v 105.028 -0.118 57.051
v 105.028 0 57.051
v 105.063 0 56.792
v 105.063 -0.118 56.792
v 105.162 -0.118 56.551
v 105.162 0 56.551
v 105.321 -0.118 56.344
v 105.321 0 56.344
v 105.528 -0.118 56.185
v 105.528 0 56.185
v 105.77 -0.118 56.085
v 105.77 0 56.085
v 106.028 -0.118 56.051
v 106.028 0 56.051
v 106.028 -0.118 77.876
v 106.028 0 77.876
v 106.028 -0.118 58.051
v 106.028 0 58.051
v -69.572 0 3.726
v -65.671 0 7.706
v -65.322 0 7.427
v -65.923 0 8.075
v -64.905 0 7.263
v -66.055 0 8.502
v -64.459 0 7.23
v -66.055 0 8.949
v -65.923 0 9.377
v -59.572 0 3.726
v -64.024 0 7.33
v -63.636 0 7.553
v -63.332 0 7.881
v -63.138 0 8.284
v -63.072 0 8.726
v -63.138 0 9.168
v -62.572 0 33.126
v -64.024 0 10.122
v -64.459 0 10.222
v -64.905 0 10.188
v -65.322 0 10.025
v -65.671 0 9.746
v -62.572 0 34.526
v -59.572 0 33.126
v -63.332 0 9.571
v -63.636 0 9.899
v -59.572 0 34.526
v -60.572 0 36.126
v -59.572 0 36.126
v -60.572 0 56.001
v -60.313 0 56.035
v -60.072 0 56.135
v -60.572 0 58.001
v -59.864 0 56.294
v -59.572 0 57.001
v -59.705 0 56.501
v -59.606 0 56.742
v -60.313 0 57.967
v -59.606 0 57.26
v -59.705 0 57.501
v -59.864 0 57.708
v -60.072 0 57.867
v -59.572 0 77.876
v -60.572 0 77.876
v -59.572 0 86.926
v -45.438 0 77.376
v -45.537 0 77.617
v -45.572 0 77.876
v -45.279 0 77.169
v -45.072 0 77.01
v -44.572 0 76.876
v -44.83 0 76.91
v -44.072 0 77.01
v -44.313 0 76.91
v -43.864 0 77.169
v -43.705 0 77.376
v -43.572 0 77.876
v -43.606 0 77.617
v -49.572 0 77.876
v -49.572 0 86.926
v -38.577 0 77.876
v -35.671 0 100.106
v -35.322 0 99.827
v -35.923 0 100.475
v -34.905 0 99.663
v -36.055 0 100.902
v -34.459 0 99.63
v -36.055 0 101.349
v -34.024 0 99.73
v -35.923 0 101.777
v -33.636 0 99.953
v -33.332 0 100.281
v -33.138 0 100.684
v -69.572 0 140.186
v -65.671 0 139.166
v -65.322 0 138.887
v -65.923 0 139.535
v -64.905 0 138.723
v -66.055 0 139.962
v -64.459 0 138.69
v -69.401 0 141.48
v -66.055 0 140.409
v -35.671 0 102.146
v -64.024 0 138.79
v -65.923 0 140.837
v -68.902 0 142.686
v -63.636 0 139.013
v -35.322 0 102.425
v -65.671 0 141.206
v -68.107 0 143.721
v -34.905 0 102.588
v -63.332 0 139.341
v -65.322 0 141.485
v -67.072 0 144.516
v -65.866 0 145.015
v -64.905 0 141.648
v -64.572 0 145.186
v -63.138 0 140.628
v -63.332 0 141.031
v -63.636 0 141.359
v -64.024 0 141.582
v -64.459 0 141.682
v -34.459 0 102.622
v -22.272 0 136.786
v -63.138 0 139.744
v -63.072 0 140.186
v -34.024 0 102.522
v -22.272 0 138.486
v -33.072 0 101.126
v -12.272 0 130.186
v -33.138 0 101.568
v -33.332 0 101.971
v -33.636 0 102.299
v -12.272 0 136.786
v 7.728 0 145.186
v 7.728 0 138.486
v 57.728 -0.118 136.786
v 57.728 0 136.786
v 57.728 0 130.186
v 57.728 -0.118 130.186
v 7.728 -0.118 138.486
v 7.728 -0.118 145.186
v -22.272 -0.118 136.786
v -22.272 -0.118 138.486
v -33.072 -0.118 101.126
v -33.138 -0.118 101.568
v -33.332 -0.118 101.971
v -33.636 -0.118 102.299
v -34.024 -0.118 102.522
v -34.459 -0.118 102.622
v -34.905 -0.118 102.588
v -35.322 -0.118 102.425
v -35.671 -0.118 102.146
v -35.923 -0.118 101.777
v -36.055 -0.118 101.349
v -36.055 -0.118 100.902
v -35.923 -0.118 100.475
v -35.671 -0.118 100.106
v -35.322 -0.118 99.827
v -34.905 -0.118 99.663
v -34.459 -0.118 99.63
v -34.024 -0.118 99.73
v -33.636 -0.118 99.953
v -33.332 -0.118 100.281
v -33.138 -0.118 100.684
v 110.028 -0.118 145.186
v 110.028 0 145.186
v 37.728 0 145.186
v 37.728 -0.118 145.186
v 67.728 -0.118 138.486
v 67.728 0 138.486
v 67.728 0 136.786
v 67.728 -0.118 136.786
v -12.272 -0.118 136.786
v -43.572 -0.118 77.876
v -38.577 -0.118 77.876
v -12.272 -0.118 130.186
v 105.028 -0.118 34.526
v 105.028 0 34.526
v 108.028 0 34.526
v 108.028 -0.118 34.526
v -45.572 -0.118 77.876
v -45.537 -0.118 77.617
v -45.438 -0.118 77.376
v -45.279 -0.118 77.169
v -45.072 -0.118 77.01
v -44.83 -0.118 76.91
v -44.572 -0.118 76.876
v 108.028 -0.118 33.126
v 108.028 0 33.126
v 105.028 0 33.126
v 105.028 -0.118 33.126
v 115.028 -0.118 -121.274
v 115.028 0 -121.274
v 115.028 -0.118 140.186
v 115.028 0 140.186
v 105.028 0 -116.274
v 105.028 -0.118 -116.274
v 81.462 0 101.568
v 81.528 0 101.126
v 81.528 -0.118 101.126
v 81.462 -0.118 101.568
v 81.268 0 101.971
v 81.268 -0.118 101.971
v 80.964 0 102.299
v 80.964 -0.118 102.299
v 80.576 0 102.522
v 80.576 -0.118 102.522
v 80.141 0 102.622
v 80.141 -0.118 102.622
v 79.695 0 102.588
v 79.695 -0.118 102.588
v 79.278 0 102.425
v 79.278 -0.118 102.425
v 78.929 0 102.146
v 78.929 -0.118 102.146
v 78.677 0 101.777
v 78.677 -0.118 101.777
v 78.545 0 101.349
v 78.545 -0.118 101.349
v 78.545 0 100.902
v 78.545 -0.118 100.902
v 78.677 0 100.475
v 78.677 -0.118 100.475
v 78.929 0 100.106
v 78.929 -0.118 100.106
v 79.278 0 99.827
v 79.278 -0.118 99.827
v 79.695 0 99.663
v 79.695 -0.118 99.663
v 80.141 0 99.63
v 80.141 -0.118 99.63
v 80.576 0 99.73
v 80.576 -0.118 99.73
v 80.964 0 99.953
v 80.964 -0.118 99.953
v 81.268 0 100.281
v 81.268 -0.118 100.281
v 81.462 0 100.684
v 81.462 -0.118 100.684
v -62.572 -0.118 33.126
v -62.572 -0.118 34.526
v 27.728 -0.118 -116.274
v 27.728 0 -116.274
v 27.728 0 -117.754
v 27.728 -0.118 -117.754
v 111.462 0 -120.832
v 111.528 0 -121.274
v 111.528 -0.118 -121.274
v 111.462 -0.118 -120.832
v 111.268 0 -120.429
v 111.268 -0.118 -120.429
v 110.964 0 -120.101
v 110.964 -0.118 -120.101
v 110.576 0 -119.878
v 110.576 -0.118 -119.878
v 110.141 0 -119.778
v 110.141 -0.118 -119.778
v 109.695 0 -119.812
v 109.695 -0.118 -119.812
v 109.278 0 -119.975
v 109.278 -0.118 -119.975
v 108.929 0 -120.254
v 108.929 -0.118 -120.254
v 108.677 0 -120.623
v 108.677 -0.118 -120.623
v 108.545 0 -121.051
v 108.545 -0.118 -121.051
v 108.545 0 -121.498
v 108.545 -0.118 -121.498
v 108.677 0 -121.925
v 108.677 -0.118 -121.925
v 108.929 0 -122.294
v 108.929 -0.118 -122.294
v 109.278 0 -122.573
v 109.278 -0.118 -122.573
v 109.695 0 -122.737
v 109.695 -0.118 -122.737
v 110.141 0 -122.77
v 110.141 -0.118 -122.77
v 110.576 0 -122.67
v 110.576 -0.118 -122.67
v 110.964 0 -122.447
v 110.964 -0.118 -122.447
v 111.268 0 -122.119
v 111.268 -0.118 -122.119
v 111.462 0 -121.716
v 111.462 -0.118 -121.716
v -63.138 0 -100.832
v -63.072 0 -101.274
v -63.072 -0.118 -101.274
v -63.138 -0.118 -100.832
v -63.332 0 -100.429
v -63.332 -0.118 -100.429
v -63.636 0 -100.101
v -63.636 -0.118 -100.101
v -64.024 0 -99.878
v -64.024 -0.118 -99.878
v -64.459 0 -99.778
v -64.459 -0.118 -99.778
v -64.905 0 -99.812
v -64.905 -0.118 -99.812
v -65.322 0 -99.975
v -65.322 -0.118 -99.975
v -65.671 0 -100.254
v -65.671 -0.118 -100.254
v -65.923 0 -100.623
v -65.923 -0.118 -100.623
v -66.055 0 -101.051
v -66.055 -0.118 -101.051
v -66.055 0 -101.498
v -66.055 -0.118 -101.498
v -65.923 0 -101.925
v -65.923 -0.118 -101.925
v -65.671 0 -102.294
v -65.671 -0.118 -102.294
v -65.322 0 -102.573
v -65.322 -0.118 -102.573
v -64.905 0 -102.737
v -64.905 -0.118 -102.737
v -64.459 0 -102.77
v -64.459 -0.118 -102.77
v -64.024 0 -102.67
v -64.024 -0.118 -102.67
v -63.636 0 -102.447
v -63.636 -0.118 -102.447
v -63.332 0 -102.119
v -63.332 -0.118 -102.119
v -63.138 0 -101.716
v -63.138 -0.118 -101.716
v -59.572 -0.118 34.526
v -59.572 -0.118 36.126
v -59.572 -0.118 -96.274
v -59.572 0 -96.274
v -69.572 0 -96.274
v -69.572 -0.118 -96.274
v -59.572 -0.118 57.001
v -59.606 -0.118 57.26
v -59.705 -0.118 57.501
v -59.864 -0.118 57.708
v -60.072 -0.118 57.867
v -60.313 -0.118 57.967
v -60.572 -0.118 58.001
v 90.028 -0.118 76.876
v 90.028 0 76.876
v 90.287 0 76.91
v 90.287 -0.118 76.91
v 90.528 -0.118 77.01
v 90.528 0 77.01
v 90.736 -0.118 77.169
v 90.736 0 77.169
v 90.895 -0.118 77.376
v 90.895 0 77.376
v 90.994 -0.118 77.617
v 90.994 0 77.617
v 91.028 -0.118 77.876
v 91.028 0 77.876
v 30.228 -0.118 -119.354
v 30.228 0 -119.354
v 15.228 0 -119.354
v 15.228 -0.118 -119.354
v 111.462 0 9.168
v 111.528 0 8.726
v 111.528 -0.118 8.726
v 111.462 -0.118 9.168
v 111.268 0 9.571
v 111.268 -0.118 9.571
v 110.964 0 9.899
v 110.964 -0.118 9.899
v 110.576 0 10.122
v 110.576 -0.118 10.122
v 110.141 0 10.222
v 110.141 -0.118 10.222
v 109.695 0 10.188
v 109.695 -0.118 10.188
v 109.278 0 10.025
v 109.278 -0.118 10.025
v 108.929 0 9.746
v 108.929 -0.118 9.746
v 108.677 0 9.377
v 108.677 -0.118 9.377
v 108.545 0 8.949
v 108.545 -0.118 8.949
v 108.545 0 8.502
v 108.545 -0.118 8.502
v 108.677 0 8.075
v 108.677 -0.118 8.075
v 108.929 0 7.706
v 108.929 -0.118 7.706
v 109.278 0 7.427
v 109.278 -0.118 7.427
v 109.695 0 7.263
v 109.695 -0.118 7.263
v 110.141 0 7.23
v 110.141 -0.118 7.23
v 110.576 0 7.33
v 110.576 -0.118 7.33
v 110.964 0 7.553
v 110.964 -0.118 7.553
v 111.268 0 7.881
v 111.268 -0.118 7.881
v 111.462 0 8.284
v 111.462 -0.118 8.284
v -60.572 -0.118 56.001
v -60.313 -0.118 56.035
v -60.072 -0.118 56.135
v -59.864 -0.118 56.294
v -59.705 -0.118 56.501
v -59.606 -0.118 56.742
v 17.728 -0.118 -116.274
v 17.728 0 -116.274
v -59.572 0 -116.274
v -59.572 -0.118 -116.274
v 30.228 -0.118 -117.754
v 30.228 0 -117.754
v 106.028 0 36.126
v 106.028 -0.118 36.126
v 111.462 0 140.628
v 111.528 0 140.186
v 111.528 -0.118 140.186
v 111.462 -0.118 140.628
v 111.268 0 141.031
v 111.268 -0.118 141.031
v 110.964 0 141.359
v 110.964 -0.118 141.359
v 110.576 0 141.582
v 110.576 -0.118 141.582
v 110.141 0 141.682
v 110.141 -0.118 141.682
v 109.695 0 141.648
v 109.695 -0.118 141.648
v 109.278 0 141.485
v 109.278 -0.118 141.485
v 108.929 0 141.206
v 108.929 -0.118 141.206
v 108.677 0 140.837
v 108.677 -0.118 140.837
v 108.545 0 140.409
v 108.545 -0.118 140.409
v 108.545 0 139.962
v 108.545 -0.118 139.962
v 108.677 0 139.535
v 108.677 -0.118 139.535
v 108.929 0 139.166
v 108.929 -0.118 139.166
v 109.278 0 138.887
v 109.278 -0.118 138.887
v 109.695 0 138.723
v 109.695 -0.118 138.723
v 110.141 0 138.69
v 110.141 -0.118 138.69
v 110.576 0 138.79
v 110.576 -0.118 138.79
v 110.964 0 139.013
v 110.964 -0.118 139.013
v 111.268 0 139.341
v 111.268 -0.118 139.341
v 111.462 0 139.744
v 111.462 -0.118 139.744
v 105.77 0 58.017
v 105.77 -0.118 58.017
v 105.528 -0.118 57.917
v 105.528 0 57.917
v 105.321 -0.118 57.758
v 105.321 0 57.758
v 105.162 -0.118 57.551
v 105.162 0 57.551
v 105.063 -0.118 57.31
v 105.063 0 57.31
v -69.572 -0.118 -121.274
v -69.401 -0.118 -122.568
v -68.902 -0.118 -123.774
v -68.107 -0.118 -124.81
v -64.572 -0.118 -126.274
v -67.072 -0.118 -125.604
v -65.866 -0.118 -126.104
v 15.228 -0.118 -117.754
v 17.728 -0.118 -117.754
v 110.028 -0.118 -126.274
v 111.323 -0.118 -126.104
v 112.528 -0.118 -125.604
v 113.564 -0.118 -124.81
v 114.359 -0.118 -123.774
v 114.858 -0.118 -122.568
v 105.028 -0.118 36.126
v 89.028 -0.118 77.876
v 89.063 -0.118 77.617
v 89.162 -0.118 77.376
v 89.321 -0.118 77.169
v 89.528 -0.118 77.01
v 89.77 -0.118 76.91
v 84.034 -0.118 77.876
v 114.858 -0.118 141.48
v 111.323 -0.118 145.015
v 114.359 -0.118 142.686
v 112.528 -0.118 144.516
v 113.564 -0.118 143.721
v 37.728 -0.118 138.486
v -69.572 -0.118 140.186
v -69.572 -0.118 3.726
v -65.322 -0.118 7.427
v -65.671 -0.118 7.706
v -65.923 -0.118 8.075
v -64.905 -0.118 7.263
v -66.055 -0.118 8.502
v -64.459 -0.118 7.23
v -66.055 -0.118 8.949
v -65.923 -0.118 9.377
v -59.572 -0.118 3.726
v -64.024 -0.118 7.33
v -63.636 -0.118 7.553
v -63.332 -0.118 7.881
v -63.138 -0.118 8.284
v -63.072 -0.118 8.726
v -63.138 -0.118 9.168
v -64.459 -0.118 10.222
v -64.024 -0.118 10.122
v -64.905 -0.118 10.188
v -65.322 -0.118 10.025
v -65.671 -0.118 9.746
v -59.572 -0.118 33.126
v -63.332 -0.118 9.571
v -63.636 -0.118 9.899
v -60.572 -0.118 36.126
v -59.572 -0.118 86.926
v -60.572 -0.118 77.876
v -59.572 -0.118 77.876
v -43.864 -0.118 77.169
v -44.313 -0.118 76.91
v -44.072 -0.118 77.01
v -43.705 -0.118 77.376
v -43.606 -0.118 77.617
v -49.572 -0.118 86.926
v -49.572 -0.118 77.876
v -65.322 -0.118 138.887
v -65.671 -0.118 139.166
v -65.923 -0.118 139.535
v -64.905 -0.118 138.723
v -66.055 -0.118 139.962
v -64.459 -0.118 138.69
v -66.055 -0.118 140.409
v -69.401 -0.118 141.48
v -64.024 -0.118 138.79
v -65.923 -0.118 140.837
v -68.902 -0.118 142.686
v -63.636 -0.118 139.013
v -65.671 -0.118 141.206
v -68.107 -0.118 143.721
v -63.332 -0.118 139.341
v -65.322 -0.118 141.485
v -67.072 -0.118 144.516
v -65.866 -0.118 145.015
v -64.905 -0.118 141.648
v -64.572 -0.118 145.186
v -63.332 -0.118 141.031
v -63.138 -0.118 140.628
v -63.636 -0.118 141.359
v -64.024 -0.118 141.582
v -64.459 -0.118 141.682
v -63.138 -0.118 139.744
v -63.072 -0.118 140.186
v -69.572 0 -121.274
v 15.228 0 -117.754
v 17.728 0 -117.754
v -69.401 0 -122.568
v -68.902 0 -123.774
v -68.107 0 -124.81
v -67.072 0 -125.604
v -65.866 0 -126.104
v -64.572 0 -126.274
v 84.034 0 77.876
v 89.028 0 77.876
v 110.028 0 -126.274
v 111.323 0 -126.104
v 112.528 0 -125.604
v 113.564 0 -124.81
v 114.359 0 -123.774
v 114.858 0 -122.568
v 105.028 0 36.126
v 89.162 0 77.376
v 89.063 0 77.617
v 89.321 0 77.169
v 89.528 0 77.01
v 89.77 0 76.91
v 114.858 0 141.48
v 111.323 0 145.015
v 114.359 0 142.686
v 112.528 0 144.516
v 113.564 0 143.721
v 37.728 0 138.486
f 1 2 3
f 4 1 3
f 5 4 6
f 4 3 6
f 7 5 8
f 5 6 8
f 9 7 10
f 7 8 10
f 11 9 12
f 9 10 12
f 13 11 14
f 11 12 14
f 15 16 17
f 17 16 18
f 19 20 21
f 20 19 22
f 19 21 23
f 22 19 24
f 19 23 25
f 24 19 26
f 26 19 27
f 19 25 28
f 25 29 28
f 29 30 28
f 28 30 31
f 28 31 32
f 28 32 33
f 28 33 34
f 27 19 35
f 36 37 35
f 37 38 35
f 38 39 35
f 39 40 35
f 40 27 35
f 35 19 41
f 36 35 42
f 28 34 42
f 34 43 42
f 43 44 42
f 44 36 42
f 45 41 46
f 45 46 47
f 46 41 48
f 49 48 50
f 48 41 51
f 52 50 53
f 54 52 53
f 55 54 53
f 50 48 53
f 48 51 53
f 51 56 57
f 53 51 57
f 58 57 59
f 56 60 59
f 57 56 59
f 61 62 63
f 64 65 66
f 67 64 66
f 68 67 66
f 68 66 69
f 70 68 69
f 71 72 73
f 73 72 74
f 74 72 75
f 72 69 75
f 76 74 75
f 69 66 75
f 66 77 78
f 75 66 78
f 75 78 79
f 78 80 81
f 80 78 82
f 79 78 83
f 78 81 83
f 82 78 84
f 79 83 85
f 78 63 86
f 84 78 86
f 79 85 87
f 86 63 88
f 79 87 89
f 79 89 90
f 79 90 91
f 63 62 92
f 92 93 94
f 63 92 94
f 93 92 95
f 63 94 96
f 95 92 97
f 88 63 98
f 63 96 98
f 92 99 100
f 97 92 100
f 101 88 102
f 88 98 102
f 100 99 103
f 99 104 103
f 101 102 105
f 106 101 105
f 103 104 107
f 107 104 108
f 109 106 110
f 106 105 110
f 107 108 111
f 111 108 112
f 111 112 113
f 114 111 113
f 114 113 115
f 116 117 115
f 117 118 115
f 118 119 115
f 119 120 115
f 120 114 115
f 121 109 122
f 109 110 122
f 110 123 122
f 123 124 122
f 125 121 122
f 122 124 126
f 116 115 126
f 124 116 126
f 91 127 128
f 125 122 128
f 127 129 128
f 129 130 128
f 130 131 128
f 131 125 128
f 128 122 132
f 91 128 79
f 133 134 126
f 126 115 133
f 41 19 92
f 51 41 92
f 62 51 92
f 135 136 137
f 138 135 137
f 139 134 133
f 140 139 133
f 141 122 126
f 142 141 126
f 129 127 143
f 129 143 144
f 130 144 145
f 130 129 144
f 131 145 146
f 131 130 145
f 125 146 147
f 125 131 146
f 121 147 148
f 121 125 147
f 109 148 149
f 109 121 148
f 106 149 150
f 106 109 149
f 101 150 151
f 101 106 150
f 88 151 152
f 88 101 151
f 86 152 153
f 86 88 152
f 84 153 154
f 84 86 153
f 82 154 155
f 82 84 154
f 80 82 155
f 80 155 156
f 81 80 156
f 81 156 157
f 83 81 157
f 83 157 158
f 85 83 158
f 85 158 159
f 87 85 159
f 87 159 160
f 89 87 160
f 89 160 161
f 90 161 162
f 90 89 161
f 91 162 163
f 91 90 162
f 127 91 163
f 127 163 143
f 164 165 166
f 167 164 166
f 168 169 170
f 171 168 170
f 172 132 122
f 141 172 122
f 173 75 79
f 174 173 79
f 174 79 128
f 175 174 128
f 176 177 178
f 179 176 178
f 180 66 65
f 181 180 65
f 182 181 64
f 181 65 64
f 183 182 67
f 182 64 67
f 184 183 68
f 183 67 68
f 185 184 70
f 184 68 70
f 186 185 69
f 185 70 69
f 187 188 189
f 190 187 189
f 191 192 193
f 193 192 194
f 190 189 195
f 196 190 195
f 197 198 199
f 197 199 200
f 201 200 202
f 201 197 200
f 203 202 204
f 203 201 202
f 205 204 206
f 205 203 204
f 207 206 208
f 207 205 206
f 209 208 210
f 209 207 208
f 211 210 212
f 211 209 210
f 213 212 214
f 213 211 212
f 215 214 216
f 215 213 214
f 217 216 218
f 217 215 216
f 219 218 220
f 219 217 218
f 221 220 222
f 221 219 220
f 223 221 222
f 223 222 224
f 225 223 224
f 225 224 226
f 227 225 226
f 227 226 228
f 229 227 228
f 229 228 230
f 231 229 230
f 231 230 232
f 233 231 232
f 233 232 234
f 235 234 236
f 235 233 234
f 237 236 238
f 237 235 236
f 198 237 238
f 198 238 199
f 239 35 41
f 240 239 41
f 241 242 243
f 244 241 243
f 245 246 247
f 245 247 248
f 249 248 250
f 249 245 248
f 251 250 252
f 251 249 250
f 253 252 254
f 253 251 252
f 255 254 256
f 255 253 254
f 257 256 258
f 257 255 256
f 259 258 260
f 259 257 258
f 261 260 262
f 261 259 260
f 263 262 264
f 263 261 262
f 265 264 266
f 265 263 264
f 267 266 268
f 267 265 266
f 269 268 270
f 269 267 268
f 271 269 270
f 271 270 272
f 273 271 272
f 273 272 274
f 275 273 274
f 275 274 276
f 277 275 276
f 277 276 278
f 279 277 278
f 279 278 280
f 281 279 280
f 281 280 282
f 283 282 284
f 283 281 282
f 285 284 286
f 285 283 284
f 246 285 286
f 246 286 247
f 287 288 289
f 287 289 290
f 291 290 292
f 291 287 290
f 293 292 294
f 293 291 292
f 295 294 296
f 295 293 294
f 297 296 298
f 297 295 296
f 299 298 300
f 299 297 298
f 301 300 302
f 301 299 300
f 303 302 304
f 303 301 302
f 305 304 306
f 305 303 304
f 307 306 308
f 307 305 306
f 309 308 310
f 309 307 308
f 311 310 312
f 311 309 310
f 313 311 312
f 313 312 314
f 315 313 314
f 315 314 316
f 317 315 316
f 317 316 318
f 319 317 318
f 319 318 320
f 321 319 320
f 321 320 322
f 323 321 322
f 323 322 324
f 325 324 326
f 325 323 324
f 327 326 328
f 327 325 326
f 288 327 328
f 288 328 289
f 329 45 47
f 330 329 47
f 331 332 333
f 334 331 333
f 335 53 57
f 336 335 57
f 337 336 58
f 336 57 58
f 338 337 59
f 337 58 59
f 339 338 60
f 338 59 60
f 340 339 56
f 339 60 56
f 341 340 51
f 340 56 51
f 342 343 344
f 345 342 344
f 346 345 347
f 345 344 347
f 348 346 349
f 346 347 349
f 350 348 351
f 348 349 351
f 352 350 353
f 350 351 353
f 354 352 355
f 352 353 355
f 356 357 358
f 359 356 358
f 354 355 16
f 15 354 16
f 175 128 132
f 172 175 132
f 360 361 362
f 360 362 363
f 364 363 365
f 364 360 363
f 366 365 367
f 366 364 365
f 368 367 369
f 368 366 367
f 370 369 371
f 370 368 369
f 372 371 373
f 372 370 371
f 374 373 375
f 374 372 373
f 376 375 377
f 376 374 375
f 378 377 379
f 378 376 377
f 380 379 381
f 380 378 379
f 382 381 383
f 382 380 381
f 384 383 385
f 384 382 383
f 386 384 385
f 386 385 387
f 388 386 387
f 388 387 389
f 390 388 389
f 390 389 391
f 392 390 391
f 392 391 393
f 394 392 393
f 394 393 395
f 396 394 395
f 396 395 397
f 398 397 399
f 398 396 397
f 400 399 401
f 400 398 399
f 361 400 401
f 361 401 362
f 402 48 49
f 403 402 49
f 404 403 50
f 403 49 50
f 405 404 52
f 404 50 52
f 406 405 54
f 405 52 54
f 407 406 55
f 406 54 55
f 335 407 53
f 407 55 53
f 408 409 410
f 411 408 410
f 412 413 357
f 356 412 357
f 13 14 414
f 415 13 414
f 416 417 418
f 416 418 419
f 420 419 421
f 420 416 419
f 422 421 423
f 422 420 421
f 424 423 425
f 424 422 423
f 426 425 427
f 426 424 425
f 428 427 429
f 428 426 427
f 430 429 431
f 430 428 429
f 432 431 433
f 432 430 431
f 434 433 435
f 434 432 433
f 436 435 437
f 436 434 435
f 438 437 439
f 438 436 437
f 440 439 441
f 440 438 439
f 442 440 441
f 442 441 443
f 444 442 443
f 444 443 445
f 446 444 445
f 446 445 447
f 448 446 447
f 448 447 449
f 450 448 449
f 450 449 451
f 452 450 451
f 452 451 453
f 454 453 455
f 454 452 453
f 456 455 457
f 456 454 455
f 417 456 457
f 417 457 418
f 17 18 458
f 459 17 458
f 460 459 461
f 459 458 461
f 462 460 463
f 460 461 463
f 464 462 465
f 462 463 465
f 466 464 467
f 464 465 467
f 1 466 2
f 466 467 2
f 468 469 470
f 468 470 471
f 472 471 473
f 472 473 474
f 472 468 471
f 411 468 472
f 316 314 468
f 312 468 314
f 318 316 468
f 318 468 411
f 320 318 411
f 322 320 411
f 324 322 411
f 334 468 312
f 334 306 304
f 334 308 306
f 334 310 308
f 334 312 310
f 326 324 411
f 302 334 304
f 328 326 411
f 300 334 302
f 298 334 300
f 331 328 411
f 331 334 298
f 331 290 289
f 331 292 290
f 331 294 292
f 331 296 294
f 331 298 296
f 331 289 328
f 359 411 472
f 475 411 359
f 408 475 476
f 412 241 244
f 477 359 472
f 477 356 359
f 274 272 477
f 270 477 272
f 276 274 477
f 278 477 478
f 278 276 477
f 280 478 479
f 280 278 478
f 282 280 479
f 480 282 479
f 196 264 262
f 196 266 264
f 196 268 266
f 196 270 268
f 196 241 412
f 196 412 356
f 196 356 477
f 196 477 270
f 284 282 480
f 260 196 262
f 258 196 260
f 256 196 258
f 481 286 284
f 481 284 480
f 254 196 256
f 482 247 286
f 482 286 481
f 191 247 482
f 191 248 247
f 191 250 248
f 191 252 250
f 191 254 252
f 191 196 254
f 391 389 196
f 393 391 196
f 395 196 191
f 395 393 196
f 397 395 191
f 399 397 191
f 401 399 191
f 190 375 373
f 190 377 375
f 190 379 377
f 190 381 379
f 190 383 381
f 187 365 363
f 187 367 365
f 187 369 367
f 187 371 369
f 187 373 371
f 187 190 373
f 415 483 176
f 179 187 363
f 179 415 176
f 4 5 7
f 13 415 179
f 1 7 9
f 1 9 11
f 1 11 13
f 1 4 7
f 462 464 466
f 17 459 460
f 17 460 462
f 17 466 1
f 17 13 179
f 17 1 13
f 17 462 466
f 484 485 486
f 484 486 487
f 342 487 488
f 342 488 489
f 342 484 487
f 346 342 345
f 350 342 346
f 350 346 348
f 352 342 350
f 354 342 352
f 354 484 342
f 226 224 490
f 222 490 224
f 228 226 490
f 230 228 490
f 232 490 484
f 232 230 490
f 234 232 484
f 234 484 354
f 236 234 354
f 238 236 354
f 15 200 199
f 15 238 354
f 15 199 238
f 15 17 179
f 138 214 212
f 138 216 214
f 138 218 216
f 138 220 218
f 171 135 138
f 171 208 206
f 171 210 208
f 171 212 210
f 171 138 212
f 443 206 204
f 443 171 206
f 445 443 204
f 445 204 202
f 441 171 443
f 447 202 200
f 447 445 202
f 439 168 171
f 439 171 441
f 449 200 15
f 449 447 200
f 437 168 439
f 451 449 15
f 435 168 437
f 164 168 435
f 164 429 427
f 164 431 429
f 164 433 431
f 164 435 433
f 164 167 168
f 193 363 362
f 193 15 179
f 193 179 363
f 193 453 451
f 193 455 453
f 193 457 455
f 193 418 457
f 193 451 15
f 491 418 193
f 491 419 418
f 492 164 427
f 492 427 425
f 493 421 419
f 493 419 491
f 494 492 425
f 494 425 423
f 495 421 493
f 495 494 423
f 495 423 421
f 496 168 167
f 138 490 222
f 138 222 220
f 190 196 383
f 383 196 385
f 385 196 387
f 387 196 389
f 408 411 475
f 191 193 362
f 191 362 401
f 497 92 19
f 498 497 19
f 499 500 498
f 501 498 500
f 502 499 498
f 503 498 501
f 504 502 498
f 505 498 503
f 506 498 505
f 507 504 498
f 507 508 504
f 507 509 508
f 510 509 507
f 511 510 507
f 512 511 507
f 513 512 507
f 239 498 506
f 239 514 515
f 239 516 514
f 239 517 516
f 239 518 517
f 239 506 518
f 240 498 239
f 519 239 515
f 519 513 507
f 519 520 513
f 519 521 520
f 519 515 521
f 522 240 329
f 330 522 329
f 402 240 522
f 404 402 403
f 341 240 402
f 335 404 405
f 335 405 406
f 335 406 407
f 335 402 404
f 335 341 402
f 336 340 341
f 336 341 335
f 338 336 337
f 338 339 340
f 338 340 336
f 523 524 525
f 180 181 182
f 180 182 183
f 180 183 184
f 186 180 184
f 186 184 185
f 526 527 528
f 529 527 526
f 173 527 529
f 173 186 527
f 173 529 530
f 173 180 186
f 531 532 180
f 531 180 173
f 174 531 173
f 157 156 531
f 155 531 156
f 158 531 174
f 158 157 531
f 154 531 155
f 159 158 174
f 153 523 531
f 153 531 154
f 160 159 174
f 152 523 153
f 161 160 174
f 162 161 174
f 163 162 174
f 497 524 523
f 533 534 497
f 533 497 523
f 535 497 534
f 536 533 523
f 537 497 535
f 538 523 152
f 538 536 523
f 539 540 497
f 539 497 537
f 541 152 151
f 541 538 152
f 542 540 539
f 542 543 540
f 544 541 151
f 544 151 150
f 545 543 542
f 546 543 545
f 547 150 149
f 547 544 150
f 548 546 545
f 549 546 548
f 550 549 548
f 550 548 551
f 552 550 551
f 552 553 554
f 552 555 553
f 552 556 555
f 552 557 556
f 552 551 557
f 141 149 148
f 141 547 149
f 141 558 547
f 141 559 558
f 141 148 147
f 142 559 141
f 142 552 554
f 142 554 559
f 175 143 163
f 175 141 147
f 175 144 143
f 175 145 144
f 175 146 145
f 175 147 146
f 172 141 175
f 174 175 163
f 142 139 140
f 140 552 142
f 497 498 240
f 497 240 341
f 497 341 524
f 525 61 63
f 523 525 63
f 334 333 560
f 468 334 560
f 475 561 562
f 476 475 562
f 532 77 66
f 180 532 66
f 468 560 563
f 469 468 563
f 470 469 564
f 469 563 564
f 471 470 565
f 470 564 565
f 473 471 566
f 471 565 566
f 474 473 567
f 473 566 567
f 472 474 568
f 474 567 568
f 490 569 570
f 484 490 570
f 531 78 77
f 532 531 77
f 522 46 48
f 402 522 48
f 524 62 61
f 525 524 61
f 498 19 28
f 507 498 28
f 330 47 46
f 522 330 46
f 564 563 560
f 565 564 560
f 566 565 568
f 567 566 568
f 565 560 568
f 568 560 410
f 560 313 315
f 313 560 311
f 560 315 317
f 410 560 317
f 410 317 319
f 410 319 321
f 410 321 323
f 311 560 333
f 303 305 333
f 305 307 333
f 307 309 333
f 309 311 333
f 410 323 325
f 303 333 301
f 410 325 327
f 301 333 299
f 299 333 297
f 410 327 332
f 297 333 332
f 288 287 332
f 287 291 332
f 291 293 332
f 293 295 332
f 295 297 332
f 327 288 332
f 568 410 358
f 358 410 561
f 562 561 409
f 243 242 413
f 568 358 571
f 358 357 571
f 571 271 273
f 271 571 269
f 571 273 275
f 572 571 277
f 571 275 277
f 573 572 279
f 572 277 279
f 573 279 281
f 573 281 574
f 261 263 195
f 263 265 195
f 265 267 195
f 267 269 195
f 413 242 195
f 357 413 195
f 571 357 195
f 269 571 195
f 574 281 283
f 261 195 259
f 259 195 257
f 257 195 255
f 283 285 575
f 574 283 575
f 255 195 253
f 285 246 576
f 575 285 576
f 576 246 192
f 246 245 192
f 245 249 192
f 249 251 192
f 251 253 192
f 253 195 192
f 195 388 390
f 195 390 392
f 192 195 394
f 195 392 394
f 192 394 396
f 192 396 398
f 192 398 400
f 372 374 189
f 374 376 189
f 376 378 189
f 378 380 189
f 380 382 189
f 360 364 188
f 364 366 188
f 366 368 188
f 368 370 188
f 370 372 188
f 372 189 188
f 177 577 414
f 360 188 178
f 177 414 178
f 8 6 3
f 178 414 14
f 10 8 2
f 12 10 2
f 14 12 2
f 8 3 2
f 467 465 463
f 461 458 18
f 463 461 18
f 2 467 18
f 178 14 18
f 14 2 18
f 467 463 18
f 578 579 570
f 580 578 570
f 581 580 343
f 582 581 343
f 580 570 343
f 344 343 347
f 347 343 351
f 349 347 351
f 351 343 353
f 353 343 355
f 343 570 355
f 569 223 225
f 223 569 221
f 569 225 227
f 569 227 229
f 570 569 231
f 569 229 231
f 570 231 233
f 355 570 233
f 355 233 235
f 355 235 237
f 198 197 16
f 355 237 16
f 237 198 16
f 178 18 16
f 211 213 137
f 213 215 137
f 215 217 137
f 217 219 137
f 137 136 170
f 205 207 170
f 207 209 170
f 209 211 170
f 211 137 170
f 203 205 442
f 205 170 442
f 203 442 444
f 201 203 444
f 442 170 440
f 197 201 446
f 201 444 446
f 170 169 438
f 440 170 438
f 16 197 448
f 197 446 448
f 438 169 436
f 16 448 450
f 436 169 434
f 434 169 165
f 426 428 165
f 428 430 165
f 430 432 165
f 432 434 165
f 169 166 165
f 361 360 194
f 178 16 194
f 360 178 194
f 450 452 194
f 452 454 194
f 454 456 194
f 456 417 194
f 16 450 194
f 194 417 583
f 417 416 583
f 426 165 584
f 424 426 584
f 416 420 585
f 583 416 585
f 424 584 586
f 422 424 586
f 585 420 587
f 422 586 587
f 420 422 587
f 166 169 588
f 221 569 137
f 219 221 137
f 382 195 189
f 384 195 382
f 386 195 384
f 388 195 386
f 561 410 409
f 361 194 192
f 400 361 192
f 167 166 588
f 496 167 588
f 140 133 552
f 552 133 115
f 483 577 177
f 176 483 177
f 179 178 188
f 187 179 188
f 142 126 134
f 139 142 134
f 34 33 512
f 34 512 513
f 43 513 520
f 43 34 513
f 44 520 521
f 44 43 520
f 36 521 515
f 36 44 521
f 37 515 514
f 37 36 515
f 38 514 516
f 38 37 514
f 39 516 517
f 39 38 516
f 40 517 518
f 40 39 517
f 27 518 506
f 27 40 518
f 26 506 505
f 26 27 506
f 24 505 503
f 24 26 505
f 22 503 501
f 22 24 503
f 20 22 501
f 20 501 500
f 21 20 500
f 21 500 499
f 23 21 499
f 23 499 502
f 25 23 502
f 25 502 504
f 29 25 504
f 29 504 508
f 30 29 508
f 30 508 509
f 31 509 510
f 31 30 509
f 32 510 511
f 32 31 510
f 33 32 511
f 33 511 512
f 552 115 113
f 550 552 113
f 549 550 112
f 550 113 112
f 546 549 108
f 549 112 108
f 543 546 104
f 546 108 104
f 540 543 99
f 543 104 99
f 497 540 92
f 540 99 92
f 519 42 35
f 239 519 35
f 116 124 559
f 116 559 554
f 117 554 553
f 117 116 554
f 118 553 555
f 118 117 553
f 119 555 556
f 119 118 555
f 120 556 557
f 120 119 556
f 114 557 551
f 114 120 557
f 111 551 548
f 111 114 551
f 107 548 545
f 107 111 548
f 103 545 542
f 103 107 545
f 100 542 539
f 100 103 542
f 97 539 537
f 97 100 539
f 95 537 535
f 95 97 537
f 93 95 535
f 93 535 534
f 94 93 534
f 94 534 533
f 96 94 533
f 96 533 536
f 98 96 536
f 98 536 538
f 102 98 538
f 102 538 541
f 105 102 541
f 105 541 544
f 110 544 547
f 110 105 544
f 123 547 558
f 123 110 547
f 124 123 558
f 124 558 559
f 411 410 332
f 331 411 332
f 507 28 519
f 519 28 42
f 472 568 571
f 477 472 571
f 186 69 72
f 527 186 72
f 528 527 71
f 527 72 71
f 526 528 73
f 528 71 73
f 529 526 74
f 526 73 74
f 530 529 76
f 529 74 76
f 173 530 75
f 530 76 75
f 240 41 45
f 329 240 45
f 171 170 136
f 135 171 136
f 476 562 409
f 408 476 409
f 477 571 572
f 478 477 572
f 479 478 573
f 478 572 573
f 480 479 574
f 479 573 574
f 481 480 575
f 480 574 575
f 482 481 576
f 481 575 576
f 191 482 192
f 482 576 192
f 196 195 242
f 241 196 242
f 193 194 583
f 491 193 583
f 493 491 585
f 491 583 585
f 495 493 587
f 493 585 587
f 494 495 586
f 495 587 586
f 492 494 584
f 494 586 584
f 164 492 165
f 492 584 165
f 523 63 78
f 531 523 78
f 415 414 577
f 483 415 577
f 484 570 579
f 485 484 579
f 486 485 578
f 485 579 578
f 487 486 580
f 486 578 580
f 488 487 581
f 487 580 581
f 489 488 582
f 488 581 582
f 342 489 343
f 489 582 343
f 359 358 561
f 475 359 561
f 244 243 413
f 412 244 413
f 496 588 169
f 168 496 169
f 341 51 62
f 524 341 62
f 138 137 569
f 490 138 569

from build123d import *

# Parameters (mm, degrees)
F0_R     = 1.5
F0_W     = 3
F0_H     = 0.6
F1_DEPTH = 0.118


with BuildPart() as f1:
    # F0 (on Front) → F1 (new body)
    with BuildSketch(Plane.XZ):
        with BuildLine():
            Line((110.0284859866, 145.1858304774), (37.7284859866, 145.1858304774))
            Line((37.7284859866, 145.1858304774), (37.7284859866, 138.4858304774))
            Line((37.7284859866, 138.4858304774), (67.7284859866, 138.4858304774))
            Line((67.7284859866, 138.4858304774), (67.7284859866, 136.7858304774))
            Line((67.7284859866, 136.7858304774), (57.7284859866, 136.7858304774))
            Line((57.7284859866, 136.7858304774), (57.7284859866, 135.1858304774))
            Line((57.7284859866, 135.1858304774), (105.0284859866, 135.1858304774))
            Line((105.0284859866, 135.1858304774), (105.0284859866, 77.8758304774))
            Line((105.0284859866, 77.8758304774), (106.0284859866, 77.8758304774))
            Line((106.0284859866, 77.8758304774), (106.0284859866, 58.0508304774))
            ThreePointArc((106.0284859866, 58.0508304774), (106.7355927678, 57.7579372586), (107.0284859866, 57.0508304774))
            ThreePointArc((107.0284859866, 57.0508304774), (106.7355927678, 56.3437236962), (106.0284859866, 56.0508304774))
            Line((106.0284859866, 56.0508304774), (106.0284859866, 36.1258304774))
            Line((106.0284859866, 36.1258304774), (105.0284859866, 36.1258304774))
            Line((105.0284859866, 36.1258304774), (105.0284859866, 35.1258304774))
            Line((105.0284859866, 35.1258304774), (108.0284859866, 35.1258304774))
            Line((108.0284859866, 35.1258304774), (108.0284859866, 34.5258304774))
            Line((108.0284859866, 34.5258304774), (108.0284859866, 33.1258304774))
            Line((108.0284859866, 33.1258304774), (105.0284859866, 33.1258304774))
            Line((105.0284859866, 33.1258304774), (105.0284859866, 23.1258304774))
            Line((105.0284859866, 23.1258304774), (105.0284859866, -116.2741695226))
            Line((105.0284859866, -116.2741695226), (27.7284859866, -116.2741695226))
            Line((27.7284859866, -116.2741695226), (27.7284859866, -117.7541695226))
            Line((27.7284859866, -117.7541695226), (30.2284859866, -117.7541695226))
            Line((30.2284859866, -117.7541695226), (30.2284859866, -119.3541695226))
            Line((30.2284859866, -119.3541695226), (15.2284859866, -119.3541695226))
            Line((15.2284859866, -119.3541695226), (15.2284859866, -117.7541695226))
            Line((15.2284859866, -117.7541695226), (17.7284859866, -117.7541695226))
            Line((17.7284859866, -117.7541695226), (17.7284859866, -116.2741695226))
            Line((17.7284859866, -116.2741695226), (-59.5715140134, -116.2741695226))
            Line((-59.5715140134, -116.2741695226), (-59.5715140134, -96.2741695226))
            Line((-59.5715140134, -96.2741695226), (-69.5715140134, -96.2741695226))
            Line((-69.5715140134, -96.2741695226), (-69.5715140134, -121.2741695226))
            ThreePointArc((-69.5715140134, -121.2741695226), (-68.1070479193, -124.8097034285), (-64.5715140134, -126.2741695226))
            Line((-64.5715140134, -126.2741695226), (110.0284859866, -126.2741695226))
            ThreePointArc((110.0284859866, -126.2741695226), (113.5640198925, -124.8097034285), (115.0284859866, -121.2741695226))
            Line((115.0284859866, -121.2741695226), (115.0284859866, 140.1858304774))
            ThreePointArc((115.0284859866, 140.1858304774), (113.5640198925, 143.7213643833), (110.0284859866, 145.1858304774))
        make_face()
        with Locations((-64.5715140134, -101.2741695226)):
            Circle(F0_R, mode=Mode.SUBTRACT)
        with Locations((110.0284859866, -121.2741695226)):
            Circle(F0_R, mode=Mode.SUBTRACT)
        with Locations((110.0284859866, 8.7258304774)):
            Circle(F0_R, mode=Mode.SUBTRACT)
        with Locations((110.0284859866, 140.1858304774)):
            Circle(F0_R, mode=Mode.SUBTRACT)
        with Locations((106.5284859866, 34.8258304774)):
            Rectangle(F0_W, F0_H)
        with BuildLine():
            Line((105.0284859866, 135.1858304774), (57.7284859866, 135.1858304774))
            Line((57.7284859866, 135.1858304774), (57.7284859866, 130.1858304774))
            Line((57.7284859866, 130.1858304774), (84.0336422698, 77.8758304774))
            Line((84.0336422698, 77.8758304774), (89.0284859866, 77.8758304774))
            ThreePointArc((89.0284859866, 77.8758304774), (90.0284859866, 78.8758304774), (91.0284859866, 77.8758304774))
            Line((91.0284859866, 77.8758304774), (105.0284859866, 77.8758304774))
            Line((105.0284859866, 77.8758304774), (105.0284859866, 135.1858304774))
        make_face()
        with Locations((80.0284859866, 101.1258304774)):
            Circle(F0_R, mode=Mode.SUBTRACT)
        with BuildLine():
            ThreePointArc((107.0284859866, 57.0508304774), (106.7355927678, 57.7579372586), (106.0284859866, 58.0508304774))
            Line((106.0284859866, 58.0508304774), (106.0284859866, 56.0508304774))
            ThreePointArc((106.0284859866, 56.0508304774), (106.7355927678, 56.3437236962), (107.0284859866, 57.0508304774))
        make_face()
        with BuildLine():
            Line((106.0284859866, 56.0508304774), (106.0284859866, 58.0508304774))
            ThreePointArc((106.0284859866, 58.0508304774), (105.3213792054, 57.7579372586), (105.0284859866, 57.0508304774))
            ThreePointArc((105.0284859866, 57.0508304774), (105.3213792054, 56.3437236962), (106.0284859866, 56.0508304774))
        make_face()
        with BuildLine():
            ThreePointArc((90.0284859866, 76.8758304774), (90.7355927678, 77.1687236962), (91.0284859866, 77.8758304774))
            Line((91.0284859866, 77.8758304774), (89.0284859866, 77.8758304774))
            ThreePointArc((89.0284859866, 77.8758304774), (89.3213792054, 77.1687236962), (90.0284859866, 76.8758304774))
        make_face()
        with BuildLine():
            Line((89.0284859866, 77.8758304774), (91.0284859866, 77.8758304774))
            ThreePointArc((91.0284859866, 77.8758304774), (90.0284859866, 78.8758304774), (89.0284859866, 77.8758304774))
        make_face()
    extrude(amount=F1_DEPTH)


with BuildPart() as f1b:
    # F0 (on Front) → F1, piece 2 (new body)
    with BuildSketch(Plane.XZ):
        with Locations((-61.0715140134, 34.8258304774)):
            Rectangle(F0_W, F0_H)
        with BuildLine():
            Line((-60.5715140134, 56.0008304774), (-60.5715140134, 58.0008304774))
            ThreePointArc((-60.5715140134, 58.0008304774), (-61.5715140134, 57.0008304774), (-60.5715140134, 56.0008304774))
        make_face()
        with BuildLine():
            ThreePointArc((-60.5715140134, 56.0008304774), (-59.8644072322, 56.2937236962), (-59.5715140134, 57.0008304774))
            ThreePointArc((-59.5715140134, 57.0008304774), (-59.8644072322, 57.7079372586), (-60.5715140134, 58.0008304774))
            Line((-60.5715140134, 58.0008304774), (-60.5715140134, 56.0008304774))
        make_face()
        with BuildLine():
            Line((7.7284859866, 145.1858304774), (-64.5715140134, 145.1858304774))
            ThreePointArc((-64.5715140134, 145.1858304774), (-68.1070479193, 143.7213643833), (-69.5715140134, 140.1858304774))
            Line((-69.5715140134, 140.1858304774), (-69.5715140134, 3.7258304774))
            Line((-69.5715140134, 3.7258304774), (-59.5715140134, 3.7258304774))
            Line((-59.5715140134, 3.7258304774), (-59.5715140134, 23.1258304774))
            Line((-59.5715140134, 23.1258304774), (-59.5715140134, 33.1258304774))
            Line((-59.5715140134, 33.1258304774), (-62.5715140134, 33.1258304774))
            Line((-62.5715140134, 33.1258304774), (-62.5715140134, 34.5258304774))
            Line((-62.5715140134, 34.5258304774), (-62.5715140134, 35.1258304774))
            Line((-62.5715140134, 35.1258304774), (-59.5715140134, 35.1258304774))
            Line((-59.5715140134, 35.1258304774), (-59.5715140134, 36.1258304774))
            Line((-59.5715140134, 36.1258304774), (-60.5715140134, 36.1258304774))
            Line((-60.5715140134, 36.1258304774), (-60.5715140134, 56.0008304774))
            ThreePointArc((-60.5715140134, 56.0008304774), (-61.5715140134, 57.0008304774), (-60.5715140134, 58.0008304774))
            Line((-60.5715140134, 58.0008304774), (-60.5715140134, 77.8758304774))
            Line((-60.5715140134, 77.8758304774), (-59.5715140134, 77.8758304774))
            Line((-59.5715140134, 77.8758304774), (-59.5715140134, 86.9258304774))
            Line((-59.5715140134, 86.9258304774), (-59.5715140134, 135.1858304774))
            Line((-59.5715140134, 135.1858304774), (-12.2715140134, 135.1858304774))
            Line((-12.2715140134, 135.1858304774), (-12.2715140134, 136.7858304774))
            Line((-12.2715140134, 136.7858304774), (-22.2715140134, 136.7858304774))
            Line((-22.2715140134, 136.7858304774), (-22.2715140134, 138.4858304774))
            Line((-22.2715140134, 138.4858304774), (7.7284859866, 138.4858304774))
            Line((7.7284859866, 138.4858304774), (7.7284859866, 145.1858304774))
        make_face()
        with Locations((-64.5715140134, 8.7258304774)):
            Circle(F0_R, mode=Mode.SUBTRACT)
        with Locations((-64.5715140134, 140.1858304774)):
            Circle(F0_R, mode=Mode.SUBTRACT)
        with BuildLine():
            Line((-12.2715140134, 130.1858304774), (-12.2715140134, 135.1858304774))
            Line((-12.2715140134, 135.1858304774), (-59.5715140134, 135.1858304774))
            Line((-59.5715140134, 135.1858304774), (-59.5715140134, 86.9258304774))
            Line((-59.5715140134, 86.9258304774), (-49.5715140134, 86.9258304774))
            Line((-49.5715140134, 86.9258304774), (-49.5715140134, 77.8758304774))
            Line((-49.5715140134, 77.8758304774), (-45.5715140134, 77.8758304774))
            ThreePointArc((-45.5715140134, 77.8758304774), (-44.5715140134, 78.8758304774), (-43.5715140134, 77.8758304774))
            Line((-43.5715140134, 77.8758304774), (-38.5766702966, 77.8758304774))
            Line((-38.5766702966, 77.8758304774), (-12.2715140134, 130.1858304774))
        make_face()
        with Locations((-34.5715140134, 101.1258304774)):
            Circle(F0_R, mode=Mode.SUBTRACT)
        with BuildLine():
            ThreePointArc((-44.5715140134, 76.8758304774), (-43.8644072322, 77.1687236962), (-43.5715140134, 77.8758304774))
            Line((-43.5715140134, 77.8758304774), (-45.5715140134, 77.8758304774))
            ThreePointArc((-45.5715140134, 77.8758304774), (-45.2786207946, 77.1687236962), (-44.5715140134, 76.8758304774))
        make_face()
        with BuildLine():
            Line((-45.5715140134, 77.8758304774), (-43.5715140134, 77.8758304774))
            ThreePointArc((-43.5715140134, 77.8758304774), (-44.5715140134, 78.8758304774), (-45.5715140134, 77.8758304774))
        make_face()
    extrude(amount=F1_DEPTH)


solid = Compound([f1.part, f1b.part])
